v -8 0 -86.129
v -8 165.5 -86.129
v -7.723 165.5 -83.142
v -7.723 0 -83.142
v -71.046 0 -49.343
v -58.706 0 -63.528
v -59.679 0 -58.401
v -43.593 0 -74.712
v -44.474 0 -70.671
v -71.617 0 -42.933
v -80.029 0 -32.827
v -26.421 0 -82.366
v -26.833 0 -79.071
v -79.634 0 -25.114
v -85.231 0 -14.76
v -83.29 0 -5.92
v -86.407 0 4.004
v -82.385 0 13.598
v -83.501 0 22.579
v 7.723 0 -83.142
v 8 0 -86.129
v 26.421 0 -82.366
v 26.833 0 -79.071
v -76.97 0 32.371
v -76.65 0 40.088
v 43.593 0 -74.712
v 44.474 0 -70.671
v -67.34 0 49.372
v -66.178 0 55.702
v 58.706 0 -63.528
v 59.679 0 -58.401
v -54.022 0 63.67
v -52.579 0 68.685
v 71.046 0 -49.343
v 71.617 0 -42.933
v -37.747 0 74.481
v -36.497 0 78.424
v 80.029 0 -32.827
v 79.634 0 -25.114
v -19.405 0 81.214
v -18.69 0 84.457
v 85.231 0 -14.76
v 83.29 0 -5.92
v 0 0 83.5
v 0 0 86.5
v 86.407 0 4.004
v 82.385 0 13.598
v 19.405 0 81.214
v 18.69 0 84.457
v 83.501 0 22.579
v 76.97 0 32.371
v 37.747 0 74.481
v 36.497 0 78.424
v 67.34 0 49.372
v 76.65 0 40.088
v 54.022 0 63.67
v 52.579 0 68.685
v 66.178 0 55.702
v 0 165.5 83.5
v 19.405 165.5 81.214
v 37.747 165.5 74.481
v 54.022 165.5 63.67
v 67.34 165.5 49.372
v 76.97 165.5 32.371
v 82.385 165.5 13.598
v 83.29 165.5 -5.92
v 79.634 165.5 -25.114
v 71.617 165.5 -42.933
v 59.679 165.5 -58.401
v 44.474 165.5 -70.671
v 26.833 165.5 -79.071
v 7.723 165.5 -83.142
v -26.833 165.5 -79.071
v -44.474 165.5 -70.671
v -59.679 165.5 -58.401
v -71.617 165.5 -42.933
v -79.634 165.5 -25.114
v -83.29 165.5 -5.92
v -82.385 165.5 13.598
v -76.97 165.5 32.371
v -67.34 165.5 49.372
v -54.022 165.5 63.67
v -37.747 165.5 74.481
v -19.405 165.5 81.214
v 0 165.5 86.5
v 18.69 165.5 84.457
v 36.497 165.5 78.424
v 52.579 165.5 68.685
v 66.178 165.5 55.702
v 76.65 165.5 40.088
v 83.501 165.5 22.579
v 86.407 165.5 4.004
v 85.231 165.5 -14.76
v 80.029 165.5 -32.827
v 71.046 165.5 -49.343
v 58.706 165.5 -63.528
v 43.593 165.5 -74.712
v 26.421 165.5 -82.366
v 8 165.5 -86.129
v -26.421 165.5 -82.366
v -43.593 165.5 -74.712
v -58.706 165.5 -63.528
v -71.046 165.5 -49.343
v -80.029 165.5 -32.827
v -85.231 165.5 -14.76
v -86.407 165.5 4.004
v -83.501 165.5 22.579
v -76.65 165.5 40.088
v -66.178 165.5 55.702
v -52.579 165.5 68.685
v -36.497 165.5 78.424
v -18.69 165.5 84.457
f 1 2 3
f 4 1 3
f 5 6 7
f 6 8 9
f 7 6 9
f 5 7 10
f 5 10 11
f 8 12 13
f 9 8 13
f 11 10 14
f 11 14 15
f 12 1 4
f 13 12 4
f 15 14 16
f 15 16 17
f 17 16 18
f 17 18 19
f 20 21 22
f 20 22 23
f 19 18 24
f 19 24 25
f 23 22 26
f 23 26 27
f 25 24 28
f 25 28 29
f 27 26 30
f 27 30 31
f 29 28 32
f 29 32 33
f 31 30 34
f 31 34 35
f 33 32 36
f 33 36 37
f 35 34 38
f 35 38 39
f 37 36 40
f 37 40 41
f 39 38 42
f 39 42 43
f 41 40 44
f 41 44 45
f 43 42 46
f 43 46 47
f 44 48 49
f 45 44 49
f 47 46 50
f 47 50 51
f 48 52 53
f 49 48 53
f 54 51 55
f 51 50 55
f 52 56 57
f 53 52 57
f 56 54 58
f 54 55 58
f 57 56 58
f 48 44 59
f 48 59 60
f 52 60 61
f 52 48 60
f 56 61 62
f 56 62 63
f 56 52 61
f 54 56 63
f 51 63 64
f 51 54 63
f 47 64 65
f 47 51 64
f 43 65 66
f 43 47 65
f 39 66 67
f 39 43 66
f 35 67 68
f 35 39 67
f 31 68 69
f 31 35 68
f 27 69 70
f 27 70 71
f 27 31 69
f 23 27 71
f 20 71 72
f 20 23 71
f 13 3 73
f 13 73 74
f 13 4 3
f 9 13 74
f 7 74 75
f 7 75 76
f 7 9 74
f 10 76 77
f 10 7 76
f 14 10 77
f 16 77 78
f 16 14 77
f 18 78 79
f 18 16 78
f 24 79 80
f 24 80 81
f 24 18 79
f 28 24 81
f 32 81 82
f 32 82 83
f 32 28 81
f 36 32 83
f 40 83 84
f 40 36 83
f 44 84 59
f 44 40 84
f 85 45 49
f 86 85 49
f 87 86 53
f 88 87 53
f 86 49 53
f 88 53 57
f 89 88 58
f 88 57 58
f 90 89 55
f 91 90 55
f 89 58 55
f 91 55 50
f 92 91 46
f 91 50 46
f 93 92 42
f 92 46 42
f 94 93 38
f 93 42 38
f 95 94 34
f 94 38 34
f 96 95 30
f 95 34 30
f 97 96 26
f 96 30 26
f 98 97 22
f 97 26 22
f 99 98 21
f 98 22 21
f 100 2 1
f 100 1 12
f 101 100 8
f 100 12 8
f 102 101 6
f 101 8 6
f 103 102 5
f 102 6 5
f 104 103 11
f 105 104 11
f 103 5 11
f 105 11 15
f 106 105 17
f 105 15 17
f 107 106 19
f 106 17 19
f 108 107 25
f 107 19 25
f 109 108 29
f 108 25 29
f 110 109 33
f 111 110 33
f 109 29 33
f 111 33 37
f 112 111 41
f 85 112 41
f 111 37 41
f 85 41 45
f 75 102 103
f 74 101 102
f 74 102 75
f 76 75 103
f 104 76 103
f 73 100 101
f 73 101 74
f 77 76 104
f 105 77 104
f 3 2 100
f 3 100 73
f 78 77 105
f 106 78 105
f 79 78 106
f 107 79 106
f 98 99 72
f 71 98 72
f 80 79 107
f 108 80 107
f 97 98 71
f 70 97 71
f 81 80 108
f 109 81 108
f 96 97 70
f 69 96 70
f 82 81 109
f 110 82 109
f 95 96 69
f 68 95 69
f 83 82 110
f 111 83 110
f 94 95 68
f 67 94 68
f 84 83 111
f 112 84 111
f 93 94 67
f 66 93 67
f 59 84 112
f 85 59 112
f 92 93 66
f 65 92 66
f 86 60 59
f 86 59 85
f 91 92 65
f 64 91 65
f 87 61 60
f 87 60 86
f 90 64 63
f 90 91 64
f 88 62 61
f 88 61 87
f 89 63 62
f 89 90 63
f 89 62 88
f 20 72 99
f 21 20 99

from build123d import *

# Parameters (mm, degrees)
SKETCH_1_R               = 86.5
SKETCH_1_R_2             = 83.5
EXTRUDE_1_DEPTH          = 165.5
CUT_EXTRUDE_1_DEPTH      = 206.802696775
CUT_EXTRUDE_1_DEPTH_BACK = 206.802696775


with BuildPart() as part:
    # Эскиз1 → Бобышка-Вытянуть1 (new body)
    with BuildSketch(Plane(origin=(0, 0, 0), x_dir=(1, 0, 0), z_dir=(0, 1, 0))):
        with Locations(Location((0, 0, 0), (0, 0, 270))):
            Circle(SKETCH_1_R)
        with Locations(Location((0, 0, 0), (0, 0, 270))):
            Circle(SKETCH_1_R_2, mode=Mode.SUBTRACT)
    extrude(amount=EXTRUDE_1_DEPTH)

    # Эскиз2 → Вырез-Вытянуть1 (cut, two sides: drawn at the far end of the back side and taken through both)
    with BuildSketch(Plane(origin=(0, 165.5, 0), x_dir=(1, 0, 0), z_dir=(0, 1, 0)).offset(-CUT_EXTRUDE_1_DEPTH_BACK)):
        with BuildLine():
            Line((-8, 86.12926332), (-7.722543353, 83.142121239))
            ThreePointArc((-7.722543353, 83.142121239), (0, 83.5), (7.722543353, 83.142121239))
            Line((7.722543353, 83.142121239), (8, 86.12926332))
            ThreePointArc((8, 86.12926332), (0, 86.5), (-8, 86.12926332))
        make_face()
    extrude(amount=CUT_EXTRUDE_1_DEPTH + CUT_EXTRUDE_1_DEPTH_BACK, mode=Mode.SUBTRACT)


solid = part.part
